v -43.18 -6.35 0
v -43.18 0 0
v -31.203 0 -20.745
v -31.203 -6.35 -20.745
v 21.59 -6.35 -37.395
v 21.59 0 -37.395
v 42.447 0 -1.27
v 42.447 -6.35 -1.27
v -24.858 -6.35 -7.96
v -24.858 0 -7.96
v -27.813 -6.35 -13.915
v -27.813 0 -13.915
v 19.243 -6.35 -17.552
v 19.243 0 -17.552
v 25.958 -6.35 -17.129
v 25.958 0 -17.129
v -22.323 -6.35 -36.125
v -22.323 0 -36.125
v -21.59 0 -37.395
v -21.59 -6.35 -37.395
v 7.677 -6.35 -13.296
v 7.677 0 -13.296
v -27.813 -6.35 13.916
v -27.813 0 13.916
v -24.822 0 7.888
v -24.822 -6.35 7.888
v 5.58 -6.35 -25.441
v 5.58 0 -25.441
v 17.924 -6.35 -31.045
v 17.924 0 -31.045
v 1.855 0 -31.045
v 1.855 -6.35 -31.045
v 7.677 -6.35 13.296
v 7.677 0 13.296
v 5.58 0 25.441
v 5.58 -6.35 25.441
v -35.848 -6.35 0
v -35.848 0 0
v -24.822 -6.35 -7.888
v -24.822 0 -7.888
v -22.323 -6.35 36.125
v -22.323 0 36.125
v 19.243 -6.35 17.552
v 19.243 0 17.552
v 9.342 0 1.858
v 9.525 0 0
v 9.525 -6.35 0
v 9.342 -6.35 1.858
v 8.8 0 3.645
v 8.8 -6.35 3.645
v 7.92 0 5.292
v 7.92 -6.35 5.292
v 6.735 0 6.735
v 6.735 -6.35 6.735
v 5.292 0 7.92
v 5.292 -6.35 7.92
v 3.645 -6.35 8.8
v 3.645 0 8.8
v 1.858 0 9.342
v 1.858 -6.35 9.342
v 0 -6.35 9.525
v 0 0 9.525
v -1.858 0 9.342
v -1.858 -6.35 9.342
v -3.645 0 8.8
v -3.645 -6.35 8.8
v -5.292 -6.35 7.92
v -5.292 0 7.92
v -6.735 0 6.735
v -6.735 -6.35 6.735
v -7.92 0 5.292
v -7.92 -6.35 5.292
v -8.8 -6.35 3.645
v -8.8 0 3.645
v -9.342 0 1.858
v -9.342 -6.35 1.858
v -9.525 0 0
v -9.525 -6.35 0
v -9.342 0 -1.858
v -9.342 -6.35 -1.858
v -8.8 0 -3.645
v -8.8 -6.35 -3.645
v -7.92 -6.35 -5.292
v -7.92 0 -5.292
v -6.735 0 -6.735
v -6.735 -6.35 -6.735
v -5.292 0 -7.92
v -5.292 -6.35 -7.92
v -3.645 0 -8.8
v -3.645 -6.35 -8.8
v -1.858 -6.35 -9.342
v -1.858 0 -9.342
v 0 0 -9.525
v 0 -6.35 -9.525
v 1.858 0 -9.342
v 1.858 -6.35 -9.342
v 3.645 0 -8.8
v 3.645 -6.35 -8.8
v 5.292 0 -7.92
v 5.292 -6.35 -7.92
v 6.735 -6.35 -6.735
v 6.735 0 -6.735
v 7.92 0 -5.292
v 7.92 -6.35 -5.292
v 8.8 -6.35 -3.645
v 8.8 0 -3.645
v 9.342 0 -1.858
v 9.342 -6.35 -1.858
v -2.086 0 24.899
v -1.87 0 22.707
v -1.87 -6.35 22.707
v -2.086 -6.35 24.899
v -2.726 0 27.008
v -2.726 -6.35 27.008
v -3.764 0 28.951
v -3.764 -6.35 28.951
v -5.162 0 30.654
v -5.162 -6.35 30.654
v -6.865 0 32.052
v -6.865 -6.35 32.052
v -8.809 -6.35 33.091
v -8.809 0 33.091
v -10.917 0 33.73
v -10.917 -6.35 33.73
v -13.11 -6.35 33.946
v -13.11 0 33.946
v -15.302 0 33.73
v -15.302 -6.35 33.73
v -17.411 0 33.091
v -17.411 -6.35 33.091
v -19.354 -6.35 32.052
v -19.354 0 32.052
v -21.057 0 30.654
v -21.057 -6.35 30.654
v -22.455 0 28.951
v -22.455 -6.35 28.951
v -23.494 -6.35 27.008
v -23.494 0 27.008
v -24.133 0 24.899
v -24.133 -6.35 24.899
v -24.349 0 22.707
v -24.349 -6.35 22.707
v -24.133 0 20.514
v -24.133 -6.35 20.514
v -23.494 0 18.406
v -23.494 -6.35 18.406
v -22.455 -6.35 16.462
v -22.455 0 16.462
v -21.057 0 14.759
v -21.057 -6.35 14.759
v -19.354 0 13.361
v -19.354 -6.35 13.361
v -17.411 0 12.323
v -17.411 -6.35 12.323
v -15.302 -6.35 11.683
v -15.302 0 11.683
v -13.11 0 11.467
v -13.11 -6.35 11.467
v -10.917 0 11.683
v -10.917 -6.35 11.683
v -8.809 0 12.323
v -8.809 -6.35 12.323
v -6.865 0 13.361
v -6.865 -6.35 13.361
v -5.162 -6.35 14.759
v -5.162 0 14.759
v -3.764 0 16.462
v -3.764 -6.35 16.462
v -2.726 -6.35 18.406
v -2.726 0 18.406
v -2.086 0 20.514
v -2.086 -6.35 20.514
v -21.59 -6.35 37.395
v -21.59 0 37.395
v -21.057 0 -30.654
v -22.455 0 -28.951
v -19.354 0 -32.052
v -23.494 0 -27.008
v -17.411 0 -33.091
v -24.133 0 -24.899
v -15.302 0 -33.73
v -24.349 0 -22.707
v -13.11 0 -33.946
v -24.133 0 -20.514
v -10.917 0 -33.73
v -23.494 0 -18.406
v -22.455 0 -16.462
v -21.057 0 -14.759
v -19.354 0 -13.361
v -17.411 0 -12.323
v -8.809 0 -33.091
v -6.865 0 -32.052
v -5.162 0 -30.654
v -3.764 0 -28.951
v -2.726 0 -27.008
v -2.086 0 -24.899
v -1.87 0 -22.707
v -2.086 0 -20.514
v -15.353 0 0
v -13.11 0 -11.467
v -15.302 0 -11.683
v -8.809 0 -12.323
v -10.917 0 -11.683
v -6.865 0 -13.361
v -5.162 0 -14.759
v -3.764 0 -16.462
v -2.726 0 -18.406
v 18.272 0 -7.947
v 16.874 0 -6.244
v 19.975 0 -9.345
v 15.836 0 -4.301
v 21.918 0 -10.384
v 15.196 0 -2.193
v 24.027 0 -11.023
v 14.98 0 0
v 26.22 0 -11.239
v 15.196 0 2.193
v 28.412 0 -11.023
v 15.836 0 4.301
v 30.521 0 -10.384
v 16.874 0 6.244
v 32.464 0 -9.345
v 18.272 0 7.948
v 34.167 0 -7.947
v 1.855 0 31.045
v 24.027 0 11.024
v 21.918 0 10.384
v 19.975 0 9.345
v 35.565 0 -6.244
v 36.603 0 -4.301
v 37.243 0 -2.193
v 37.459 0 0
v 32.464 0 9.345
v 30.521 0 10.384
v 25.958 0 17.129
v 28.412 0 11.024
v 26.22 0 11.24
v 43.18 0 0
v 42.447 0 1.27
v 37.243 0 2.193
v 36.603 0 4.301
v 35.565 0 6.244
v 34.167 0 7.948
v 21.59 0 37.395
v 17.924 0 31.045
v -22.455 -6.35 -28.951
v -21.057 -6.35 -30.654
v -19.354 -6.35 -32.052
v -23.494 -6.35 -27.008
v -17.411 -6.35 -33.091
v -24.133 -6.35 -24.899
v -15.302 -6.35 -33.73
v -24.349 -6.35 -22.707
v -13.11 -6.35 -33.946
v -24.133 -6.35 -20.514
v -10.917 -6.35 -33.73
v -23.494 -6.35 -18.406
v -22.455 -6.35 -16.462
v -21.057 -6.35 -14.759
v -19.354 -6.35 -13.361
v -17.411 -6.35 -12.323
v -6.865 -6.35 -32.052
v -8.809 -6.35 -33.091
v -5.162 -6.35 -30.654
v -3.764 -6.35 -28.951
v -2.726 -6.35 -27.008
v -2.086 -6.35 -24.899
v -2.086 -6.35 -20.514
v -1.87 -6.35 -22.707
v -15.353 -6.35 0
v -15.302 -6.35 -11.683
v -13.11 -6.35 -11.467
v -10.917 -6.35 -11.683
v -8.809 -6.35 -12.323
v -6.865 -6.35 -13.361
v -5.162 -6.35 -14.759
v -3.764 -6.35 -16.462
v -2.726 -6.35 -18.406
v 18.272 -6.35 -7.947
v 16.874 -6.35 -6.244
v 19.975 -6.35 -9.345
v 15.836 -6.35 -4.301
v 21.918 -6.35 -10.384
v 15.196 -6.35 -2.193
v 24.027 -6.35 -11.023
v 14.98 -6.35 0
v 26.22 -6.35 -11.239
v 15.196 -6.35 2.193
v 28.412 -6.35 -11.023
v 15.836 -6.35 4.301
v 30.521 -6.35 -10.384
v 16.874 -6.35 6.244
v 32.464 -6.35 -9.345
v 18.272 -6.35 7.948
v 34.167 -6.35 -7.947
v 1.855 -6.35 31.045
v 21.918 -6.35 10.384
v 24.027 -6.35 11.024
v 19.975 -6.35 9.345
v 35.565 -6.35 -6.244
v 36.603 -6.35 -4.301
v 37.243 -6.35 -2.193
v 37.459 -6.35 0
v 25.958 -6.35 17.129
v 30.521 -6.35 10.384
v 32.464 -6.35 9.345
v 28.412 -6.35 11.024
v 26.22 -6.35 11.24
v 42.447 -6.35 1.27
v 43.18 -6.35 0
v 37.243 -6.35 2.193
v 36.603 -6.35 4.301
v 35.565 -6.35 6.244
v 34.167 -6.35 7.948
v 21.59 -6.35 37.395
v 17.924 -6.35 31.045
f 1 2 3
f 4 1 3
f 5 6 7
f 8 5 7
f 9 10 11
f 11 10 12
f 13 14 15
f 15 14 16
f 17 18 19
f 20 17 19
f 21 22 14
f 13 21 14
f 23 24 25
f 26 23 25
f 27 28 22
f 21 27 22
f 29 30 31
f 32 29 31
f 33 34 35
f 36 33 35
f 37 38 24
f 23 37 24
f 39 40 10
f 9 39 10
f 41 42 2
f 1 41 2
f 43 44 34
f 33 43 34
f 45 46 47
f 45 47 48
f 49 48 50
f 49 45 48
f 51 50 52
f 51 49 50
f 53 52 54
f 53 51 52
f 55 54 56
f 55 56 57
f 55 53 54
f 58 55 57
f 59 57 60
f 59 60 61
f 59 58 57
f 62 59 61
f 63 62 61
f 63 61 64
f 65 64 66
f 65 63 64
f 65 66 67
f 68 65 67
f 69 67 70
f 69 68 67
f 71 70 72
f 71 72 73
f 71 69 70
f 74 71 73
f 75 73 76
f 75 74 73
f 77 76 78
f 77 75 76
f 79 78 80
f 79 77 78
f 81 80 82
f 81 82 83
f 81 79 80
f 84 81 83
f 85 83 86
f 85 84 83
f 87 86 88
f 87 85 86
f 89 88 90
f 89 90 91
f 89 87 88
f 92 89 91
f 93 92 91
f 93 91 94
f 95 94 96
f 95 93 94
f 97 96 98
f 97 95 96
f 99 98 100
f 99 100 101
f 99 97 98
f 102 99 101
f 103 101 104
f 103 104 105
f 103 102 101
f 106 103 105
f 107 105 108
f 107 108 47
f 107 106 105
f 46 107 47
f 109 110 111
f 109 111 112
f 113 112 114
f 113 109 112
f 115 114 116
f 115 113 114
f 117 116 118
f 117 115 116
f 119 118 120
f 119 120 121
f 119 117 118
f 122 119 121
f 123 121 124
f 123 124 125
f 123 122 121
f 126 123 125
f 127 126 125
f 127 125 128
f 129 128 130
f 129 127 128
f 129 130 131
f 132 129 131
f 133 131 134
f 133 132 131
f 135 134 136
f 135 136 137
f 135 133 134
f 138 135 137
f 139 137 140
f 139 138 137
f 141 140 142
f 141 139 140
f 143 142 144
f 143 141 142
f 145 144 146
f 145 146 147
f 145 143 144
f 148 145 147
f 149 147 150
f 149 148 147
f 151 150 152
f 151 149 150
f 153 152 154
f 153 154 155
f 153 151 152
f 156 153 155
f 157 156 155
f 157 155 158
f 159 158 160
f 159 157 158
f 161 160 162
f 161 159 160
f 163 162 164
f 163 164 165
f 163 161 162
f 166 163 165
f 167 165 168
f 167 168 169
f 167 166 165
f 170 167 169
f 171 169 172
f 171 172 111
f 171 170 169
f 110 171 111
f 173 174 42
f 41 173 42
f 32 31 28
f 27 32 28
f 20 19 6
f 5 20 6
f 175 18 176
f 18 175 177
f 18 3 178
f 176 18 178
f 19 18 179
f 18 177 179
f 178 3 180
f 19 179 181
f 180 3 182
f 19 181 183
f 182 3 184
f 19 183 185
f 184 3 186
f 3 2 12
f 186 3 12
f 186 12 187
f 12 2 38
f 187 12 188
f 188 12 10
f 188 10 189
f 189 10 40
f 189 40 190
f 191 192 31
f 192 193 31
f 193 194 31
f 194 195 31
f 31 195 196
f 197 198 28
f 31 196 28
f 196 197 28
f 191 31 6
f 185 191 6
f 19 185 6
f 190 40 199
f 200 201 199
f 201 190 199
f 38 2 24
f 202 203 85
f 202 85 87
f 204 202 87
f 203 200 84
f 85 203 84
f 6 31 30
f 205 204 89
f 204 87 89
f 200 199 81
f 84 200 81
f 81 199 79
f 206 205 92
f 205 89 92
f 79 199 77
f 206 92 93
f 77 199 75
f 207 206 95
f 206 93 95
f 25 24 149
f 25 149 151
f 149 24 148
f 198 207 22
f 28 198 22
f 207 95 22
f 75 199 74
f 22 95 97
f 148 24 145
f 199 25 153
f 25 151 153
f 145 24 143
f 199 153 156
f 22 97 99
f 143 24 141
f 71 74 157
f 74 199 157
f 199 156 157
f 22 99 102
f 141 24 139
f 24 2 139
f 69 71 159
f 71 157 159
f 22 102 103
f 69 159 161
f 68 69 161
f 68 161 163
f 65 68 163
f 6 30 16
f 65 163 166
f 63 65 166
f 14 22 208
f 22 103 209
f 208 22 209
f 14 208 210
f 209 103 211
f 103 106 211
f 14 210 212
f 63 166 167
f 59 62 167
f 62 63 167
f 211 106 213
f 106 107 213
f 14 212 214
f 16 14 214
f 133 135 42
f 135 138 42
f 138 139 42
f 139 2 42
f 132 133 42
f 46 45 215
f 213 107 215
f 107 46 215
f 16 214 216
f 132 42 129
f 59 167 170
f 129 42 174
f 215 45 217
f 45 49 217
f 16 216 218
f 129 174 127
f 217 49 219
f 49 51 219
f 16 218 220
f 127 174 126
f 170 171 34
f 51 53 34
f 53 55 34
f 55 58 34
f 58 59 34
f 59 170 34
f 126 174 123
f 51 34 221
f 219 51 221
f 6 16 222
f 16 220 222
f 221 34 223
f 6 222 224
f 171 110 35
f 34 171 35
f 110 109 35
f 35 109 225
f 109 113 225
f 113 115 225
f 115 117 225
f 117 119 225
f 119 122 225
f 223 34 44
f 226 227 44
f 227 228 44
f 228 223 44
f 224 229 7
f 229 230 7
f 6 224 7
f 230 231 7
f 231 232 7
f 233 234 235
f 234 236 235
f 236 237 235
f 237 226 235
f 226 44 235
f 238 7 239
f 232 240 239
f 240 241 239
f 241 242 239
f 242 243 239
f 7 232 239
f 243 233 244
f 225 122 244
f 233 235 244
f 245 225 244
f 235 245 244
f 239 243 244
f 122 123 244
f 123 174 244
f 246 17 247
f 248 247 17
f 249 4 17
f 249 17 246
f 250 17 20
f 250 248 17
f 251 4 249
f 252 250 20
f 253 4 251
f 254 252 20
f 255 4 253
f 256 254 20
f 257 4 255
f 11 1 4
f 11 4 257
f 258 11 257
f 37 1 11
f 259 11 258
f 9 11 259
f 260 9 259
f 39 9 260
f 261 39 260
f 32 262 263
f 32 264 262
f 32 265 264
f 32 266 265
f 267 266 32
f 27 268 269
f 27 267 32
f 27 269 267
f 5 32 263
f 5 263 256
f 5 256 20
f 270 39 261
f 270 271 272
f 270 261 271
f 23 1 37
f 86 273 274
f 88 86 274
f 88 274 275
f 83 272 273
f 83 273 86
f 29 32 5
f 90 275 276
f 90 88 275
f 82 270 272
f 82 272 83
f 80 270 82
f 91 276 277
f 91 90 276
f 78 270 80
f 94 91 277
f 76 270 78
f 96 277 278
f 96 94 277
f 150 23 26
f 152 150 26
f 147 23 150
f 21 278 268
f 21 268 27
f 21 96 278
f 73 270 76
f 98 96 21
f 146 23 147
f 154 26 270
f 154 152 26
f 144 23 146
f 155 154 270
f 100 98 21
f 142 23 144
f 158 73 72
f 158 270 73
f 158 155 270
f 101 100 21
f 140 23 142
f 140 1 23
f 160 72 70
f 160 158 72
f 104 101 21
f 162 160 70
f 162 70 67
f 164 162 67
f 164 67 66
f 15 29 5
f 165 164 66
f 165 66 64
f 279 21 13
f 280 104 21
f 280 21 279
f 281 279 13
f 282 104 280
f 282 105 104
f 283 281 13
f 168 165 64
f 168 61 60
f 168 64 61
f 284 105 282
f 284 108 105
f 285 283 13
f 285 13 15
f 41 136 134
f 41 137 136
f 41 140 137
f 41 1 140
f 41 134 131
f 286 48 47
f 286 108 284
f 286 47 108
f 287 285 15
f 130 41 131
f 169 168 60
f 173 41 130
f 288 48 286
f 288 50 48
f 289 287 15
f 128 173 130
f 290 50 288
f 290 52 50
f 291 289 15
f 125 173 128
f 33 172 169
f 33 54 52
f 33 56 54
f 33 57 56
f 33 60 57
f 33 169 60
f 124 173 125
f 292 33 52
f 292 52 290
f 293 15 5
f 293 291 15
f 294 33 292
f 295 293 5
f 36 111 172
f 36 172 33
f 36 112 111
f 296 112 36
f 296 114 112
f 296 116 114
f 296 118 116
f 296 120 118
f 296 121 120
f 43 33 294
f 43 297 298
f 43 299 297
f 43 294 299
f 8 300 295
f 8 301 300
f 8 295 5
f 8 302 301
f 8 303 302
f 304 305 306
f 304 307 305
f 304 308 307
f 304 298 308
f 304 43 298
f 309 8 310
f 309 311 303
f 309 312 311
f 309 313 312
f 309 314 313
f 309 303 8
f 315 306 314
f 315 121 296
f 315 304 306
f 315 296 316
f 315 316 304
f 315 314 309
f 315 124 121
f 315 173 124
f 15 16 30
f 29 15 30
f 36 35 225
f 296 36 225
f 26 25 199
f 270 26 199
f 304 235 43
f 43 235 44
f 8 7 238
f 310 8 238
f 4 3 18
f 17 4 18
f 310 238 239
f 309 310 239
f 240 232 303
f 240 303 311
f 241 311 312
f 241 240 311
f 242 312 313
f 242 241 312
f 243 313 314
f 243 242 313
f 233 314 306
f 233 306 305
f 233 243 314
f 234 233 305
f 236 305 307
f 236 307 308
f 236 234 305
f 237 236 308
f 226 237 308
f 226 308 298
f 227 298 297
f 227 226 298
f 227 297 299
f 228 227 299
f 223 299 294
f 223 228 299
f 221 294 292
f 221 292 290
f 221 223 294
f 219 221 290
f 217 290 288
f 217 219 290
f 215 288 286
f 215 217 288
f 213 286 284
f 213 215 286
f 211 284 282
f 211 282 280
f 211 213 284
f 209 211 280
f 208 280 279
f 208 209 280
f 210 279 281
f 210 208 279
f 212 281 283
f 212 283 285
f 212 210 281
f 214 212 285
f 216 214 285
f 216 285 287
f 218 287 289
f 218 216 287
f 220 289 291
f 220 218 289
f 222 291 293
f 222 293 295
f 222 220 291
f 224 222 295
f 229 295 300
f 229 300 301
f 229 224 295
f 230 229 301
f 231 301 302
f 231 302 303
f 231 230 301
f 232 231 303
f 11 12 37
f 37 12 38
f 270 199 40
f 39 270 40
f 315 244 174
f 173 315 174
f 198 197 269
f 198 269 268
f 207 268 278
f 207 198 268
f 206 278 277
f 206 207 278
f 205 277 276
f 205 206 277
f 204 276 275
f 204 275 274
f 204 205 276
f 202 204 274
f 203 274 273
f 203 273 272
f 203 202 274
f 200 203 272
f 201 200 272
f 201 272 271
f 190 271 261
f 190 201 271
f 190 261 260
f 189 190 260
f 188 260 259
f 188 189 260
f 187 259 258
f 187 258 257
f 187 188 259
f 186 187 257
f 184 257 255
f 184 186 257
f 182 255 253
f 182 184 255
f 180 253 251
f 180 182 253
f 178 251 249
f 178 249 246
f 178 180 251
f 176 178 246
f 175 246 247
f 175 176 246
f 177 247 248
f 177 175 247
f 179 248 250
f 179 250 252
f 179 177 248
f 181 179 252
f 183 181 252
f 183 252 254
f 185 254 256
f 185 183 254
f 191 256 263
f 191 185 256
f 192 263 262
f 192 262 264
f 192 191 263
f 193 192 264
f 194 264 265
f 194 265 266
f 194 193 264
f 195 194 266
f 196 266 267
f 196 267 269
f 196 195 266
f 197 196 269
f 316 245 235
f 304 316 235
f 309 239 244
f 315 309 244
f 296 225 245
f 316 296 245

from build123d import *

# Parameters (mm, degrees)
F0_R     = 11.2395
F0_R_2   = 9.525
F1_DEPTH = 6.35


# Not quite as in the source:
# - ends of sketch curves that miss each other by under 0.0002 mm in the source are joined


with BuildPart() as f1:
    # F0 (on Front) → F1 (new body)
    with BuildSketch(Plane.XZ):
        with BuildLine():
            Line((42.4467651581, 1.27), (33.5675281941, 16.6492895541))
            Line((33.5675281941, 16.6492895541), (21.59, 37.3949769354))
            Line((21.59, 37.3949769354), (-2.3645964913, 37.3949769354))
            Line((-2.3645964913, 37.3949769354), (-20.1235303163, 37.3949769354))
            ThreePointArc((-20.1235303163, 37.3949769354), (-21.3935303163, 37.054681461), (-22.3232348419, 36.1249769354))
            Line((-22.3232348419, 36.1249769354), (-31.2024718059, 20.7456873813))
            Line((-31.2024718059, 20.7456873813), (-43.18, 0))
            Line((-43.18, 0), (-31.2027017544, -20.7452890988))
            Line((-31.2027017544, -20.7452890988), (-22.3232348418, -36.1249769356))
            ThreePointArc((-22.3232348418, -36.1249769356), (-21.9195815404, -36.6510281597), (-21.3935303163, -37.0546814611))
            ThreePointArc((-21.3935303163, -37.0546814611), (-20.7809306909, -37.3084285342), (-20.1235303165, -37.3949769354))
            Line((-20.1235303165, -37.3949769354), (-2.3645964913, -37.3949769354))
            Line((-2.3645964913, -37.3949769354), (21.59, -37.3949769354))
            Line((21.59, -37.3949769354), (33.5675281941, -16.6492895541))
            Line((33.5675281941, -16.6492895541), (42.4467651581, -1.27))
            ThreePointArc((42.4467651581, -1.27), (42.7870606325, 0), (42.4467651581, 1.27))
        make_face()
        with Locations((-13.1097560234, -22.7067635073)):
            Circle(F0_R, mode=Mode.SUBTRACT)
        Polygon((1.8552556307, -31.0449769354), (5.579663063, -25.4405181745), (7.6765207659, -13.2964418818), (19.2425445444, -17.5521669359), (25.957862804, -17.1289127727), (17.9235712565, -31.0449769354), align=None, mode=Mode.SUBTRACT)
        Polygon((-15.3532430276, -9.74608e-05), (-24.8219665561, -7.8881291301), (-24.8578663434, -7.9604670809), (-27.8131295737, -13.9154964701), (-35.8475243142, 0.000220433), (-27.8133665013, 13.915789961), (-24.8219665561, 7.8881291301), align=None, mode=Mode.SUBTRACT)
        with Locations((-13.1097560234, 22.7067635073)):
            Circle(F0_R, mode=Mode.SUBTRACT)
        Circle(F0_R_2, mode=Mode.SUBTRACT)
        with Locations((26.2195120463, 0.0001612286)):
            Circle(F0_R, mode=Mode.SUBTRACT)
        Polygon((7.6765207659, 13.2964418818), (5.579663063, 25.4405181745), (1.8552556307, 31.0449769354), (17.9235712565, 31.0449769354), (25.957862804, 17.1289127727), (19.2425445444, 17.5521669359), align=None, mode=Mode.SUBTRACT)
        with BuildLine():
            Line((43.18, 0), (42.4467651581, 1.27))
            ThreePointArc((42.4467651581, 1.27), (42.7870606325, 0), (42.4467651581, -1.27))
            Line((42.4467651581, -1.27), (43.18, 0))
        make_face()
        with BuildLine():
            ThreePointArc((-22.3232348419, 36.1249769354), (-21.3935303163, 37.054681461), (-20.1235303163, 37.3949769354))
            Line((-20.1235303163, 37.3949769354), (-21.59, 37.3949769354))
            Line((-21.59, 37.3949769354), (-22.3232348419, 36.1249769354))
        make_face()
        with BuildLine():
            Line((-21.59, -37.3949769354), (-20.1235303165, -37.3949769354))
            ThreePointArc((-20.1235303165, -37.3949769354), (-20.7809306909, -37.3084285342), (-21.3935303163, -37.0546814611))
            Line((-21.3935303163, -37.0546814611), (-21.59, -37.3949769354))
        make_face()
        with BuildLine():
            Line((-21.59, -37.3949769354), (-21.3935303163, -37.0546814611))
            ThreePointArc((-21.3935303163, -37.0546814611), (-21.9195815404, -36.6510281597), (-22.3232348418, -36.1249769356))
            Line((-22.3232348418, -36.1249769356), (-21.59, -37.3949769354))
        make_face()
    extrude(amount=F1_DEPTH)


solid = f1.part
